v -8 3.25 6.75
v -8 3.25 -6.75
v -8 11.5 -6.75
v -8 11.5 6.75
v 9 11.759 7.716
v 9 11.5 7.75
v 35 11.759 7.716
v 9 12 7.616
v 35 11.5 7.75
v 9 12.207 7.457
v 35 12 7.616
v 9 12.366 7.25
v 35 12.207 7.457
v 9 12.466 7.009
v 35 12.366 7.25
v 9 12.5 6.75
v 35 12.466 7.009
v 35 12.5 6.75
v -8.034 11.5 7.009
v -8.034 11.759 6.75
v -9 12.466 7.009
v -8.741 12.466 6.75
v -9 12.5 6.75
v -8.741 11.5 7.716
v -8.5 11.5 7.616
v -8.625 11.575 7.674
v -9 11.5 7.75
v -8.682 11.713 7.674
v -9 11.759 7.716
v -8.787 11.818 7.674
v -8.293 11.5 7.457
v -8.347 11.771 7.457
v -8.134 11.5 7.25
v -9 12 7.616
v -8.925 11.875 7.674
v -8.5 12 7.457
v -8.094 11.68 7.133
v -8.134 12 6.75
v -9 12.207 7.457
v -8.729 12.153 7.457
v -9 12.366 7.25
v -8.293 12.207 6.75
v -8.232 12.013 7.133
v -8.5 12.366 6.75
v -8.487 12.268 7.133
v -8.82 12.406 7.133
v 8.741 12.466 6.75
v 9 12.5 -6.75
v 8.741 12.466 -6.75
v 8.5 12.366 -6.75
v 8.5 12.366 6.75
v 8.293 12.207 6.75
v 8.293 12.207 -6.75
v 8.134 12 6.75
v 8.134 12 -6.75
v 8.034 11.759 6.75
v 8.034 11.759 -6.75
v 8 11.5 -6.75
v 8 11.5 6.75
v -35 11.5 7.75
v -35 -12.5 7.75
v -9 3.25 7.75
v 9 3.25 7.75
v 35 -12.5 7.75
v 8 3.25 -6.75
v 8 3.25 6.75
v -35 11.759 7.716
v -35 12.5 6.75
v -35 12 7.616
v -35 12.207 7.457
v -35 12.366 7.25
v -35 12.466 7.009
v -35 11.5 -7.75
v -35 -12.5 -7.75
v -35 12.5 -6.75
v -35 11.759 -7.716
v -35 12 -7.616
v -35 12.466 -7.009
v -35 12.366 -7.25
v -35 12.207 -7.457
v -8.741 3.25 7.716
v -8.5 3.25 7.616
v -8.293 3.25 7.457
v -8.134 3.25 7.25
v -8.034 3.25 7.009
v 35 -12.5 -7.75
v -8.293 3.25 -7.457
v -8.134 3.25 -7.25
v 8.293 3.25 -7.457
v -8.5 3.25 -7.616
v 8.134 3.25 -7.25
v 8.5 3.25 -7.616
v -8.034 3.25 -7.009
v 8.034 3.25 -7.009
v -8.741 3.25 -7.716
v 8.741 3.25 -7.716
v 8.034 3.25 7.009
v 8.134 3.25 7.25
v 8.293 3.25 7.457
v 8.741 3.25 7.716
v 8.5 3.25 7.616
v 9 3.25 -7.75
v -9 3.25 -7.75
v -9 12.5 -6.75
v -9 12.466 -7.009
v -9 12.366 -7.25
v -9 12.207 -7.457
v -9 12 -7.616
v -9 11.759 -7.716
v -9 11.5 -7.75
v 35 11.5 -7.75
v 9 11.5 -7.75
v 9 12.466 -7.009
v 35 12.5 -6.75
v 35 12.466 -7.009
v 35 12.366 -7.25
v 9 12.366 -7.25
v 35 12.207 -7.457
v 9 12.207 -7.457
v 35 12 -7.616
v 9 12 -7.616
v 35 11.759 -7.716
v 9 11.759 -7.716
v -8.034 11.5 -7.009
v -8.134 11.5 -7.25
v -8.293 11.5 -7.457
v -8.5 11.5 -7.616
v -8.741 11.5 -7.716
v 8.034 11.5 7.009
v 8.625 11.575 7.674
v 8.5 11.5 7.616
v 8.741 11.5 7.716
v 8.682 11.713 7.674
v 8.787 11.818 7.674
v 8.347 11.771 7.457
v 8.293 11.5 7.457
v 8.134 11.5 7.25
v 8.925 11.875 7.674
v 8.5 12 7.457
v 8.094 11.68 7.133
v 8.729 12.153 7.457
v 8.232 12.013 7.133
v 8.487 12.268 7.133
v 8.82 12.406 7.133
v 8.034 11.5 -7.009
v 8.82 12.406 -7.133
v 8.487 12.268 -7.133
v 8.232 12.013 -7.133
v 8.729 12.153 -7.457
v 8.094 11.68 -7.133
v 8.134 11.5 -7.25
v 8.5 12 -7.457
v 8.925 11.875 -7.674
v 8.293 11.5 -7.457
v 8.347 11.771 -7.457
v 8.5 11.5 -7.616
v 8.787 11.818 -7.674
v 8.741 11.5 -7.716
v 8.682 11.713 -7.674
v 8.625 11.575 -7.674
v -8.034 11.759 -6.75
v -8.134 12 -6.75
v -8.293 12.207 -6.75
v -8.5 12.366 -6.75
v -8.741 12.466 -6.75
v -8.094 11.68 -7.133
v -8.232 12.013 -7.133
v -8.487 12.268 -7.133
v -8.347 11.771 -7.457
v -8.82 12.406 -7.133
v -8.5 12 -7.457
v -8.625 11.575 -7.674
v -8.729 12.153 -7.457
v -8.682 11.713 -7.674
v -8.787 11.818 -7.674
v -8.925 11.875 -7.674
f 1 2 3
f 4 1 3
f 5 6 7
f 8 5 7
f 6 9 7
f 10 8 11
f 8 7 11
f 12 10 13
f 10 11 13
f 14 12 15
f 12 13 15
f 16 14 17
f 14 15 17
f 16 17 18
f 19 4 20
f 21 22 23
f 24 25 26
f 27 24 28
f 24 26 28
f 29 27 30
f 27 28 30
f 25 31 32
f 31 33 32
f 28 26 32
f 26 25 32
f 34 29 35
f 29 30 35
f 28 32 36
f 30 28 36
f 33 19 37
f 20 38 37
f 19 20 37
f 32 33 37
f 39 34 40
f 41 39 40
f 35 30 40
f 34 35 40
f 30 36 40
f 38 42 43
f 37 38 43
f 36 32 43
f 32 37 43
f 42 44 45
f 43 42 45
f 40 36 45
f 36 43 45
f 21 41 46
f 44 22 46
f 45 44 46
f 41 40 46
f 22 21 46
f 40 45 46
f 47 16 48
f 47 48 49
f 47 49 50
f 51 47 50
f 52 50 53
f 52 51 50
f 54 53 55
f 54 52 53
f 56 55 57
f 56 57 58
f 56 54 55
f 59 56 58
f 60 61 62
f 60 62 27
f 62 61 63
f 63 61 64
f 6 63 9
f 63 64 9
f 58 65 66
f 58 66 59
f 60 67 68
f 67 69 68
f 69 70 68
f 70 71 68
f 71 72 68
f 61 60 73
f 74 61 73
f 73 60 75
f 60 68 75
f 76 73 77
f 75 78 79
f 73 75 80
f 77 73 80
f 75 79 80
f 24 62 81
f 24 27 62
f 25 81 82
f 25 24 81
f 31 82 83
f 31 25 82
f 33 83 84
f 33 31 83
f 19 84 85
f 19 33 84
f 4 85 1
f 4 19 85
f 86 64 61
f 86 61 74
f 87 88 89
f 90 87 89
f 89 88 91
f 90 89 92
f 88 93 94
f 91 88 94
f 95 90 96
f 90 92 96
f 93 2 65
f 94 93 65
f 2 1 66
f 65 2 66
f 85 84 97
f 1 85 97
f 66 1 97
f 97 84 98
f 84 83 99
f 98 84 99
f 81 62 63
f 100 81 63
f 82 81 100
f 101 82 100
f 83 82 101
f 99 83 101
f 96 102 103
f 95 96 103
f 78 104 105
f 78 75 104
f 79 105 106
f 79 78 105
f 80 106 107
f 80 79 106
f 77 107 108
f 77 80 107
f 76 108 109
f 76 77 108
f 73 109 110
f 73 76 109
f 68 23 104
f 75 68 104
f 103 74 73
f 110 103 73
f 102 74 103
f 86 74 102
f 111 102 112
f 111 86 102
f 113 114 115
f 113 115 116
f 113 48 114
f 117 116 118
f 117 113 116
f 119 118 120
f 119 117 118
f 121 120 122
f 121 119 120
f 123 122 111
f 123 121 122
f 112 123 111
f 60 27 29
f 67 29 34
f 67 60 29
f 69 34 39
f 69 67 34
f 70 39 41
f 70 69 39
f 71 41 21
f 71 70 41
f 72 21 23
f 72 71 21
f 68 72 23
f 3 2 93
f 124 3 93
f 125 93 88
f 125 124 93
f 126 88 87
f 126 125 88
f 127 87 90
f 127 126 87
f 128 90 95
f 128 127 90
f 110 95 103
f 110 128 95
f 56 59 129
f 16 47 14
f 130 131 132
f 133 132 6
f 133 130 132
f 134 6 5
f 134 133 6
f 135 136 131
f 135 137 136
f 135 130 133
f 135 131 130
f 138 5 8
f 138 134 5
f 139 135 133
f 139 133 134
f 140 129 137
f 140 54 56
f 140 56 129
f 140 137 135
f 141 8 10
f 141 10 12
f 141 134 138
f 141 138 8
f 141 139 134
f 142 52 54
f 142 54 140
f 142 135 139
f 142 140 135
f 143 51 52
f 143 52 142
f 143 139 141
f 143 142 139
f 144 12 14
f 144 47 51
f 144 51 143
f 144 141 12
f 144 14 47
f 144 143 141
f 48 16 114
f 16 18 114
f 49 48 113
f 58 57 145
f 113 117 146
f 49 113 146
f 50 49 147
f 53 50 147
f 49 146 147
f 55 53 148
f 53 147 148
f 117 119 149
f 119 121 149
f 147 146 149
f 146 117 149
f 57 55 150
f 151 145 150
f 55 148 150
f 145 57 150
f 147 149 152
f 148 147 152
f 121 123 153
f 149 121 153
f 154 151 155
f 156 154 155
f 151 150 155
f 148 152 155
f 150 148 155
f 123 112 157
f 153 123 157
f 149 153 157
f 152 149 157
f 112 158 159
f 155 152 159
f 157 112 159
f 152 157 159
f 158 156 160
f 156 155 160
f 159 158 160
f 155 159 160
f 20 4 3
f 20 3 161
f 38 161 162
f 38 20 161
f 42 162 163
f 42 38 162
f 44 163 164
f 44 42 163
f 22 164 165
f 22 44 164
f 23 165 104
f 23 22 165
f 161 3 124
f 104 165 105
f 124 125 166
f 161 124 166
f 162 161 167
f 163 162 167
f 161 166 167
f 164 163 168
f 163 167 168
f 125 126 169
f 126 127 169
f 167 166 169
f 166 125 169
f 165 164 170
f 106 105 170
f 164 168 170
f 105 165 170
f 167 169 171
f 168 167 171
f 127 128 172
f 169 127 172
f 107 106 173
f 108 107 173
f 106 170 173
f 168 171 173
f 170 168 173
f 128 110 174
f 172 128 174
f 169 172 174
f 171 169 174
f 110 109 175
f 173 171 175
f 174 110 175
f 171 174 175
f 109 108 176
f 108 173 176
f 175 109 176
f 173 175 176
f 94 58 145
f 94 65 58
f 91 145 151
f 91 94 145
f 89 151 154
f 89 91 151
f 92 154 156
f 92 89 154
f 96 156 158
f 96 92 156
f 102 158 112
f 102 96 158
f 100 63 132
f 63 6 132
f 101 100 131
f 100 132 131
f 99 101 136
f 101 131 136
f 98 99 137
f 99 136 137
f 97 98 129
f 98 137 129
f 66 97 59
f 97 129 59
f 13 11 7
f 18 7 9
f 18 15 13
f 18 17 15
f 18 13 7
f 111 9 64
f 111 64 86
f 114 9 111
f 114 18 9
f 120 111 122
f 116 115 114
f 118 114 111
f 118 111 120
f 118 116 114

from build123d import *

# Parameters (mm, degrees)
SKETCH1_W           = 15.5
SKETCH1_H           = 25
BOSS_EXTRUDE1_DEPTH = 35
SKETCH2_W           = 16
SKETCH2_H           = 18.5
CUT_EXTRUDE1_DEPTH  = 16.5
FILLET1_R           = 1
FILLET2_R           = 1


with BuildPart() as part:
    # Sketch1 → Boss-Extrude1 (new body, symmetric)
    with BuildSketch(Plane(origin=(0, 0, 0), x_dir=(0, 0, -1), z_dir=(1, 0, 0))):
        Rectangle(SKETCH1_W, SKETCH1_H)
    extrude(amount=BOSS_EXTRUDE1_DEPTH, both=True)

    # Sketch2 → Cut-Extrude1 (cut, through all)
    with BuildSketch(Plane.XY.offset(7.75)):
        with Locations((0, 12.5)):
            Rectangle(SKETCH2_W, SKETCH2_H)
    extrude(amount=-CUT_EXTRUDE1_DEPTH, mode=Mode.SUBTRACT)

    # Fillet1
    fillet1_edges = [part.edges().sort_by_distance(p)[0] for p in [
        (8, 12.5, 0),
        (-8, 12.5, 0),
    ]]
    fillet(fillet1_edges, radius=FILLET1_R)

    # Fillet2
    fillet2_edges = [part.edges().sort_by_distance(p)[0] for p in [
        (-8, 7.375, 7.75),
        (8, 7.375, 7.75),
        (8, 7.375, -7.75),
        (-22, 12.5, 7.75),
        (-8.292893219, 12.207106781, 7.75),
        (8.292893219, 12.207106781, 7.75),
        (-22, 12.5, -7.75),
        (-8, 7.375, -7.75),
        (-8.292893219, 12.207106781, -7.75),
        (8.292893219, 12.207106781, -7.75),
        (22, 12.5, 7.75),
        (22, 12.5, -7.75),
    ]]
    fillet(fillet2_edges, radius=FILLET2_R)


solid = part.part
